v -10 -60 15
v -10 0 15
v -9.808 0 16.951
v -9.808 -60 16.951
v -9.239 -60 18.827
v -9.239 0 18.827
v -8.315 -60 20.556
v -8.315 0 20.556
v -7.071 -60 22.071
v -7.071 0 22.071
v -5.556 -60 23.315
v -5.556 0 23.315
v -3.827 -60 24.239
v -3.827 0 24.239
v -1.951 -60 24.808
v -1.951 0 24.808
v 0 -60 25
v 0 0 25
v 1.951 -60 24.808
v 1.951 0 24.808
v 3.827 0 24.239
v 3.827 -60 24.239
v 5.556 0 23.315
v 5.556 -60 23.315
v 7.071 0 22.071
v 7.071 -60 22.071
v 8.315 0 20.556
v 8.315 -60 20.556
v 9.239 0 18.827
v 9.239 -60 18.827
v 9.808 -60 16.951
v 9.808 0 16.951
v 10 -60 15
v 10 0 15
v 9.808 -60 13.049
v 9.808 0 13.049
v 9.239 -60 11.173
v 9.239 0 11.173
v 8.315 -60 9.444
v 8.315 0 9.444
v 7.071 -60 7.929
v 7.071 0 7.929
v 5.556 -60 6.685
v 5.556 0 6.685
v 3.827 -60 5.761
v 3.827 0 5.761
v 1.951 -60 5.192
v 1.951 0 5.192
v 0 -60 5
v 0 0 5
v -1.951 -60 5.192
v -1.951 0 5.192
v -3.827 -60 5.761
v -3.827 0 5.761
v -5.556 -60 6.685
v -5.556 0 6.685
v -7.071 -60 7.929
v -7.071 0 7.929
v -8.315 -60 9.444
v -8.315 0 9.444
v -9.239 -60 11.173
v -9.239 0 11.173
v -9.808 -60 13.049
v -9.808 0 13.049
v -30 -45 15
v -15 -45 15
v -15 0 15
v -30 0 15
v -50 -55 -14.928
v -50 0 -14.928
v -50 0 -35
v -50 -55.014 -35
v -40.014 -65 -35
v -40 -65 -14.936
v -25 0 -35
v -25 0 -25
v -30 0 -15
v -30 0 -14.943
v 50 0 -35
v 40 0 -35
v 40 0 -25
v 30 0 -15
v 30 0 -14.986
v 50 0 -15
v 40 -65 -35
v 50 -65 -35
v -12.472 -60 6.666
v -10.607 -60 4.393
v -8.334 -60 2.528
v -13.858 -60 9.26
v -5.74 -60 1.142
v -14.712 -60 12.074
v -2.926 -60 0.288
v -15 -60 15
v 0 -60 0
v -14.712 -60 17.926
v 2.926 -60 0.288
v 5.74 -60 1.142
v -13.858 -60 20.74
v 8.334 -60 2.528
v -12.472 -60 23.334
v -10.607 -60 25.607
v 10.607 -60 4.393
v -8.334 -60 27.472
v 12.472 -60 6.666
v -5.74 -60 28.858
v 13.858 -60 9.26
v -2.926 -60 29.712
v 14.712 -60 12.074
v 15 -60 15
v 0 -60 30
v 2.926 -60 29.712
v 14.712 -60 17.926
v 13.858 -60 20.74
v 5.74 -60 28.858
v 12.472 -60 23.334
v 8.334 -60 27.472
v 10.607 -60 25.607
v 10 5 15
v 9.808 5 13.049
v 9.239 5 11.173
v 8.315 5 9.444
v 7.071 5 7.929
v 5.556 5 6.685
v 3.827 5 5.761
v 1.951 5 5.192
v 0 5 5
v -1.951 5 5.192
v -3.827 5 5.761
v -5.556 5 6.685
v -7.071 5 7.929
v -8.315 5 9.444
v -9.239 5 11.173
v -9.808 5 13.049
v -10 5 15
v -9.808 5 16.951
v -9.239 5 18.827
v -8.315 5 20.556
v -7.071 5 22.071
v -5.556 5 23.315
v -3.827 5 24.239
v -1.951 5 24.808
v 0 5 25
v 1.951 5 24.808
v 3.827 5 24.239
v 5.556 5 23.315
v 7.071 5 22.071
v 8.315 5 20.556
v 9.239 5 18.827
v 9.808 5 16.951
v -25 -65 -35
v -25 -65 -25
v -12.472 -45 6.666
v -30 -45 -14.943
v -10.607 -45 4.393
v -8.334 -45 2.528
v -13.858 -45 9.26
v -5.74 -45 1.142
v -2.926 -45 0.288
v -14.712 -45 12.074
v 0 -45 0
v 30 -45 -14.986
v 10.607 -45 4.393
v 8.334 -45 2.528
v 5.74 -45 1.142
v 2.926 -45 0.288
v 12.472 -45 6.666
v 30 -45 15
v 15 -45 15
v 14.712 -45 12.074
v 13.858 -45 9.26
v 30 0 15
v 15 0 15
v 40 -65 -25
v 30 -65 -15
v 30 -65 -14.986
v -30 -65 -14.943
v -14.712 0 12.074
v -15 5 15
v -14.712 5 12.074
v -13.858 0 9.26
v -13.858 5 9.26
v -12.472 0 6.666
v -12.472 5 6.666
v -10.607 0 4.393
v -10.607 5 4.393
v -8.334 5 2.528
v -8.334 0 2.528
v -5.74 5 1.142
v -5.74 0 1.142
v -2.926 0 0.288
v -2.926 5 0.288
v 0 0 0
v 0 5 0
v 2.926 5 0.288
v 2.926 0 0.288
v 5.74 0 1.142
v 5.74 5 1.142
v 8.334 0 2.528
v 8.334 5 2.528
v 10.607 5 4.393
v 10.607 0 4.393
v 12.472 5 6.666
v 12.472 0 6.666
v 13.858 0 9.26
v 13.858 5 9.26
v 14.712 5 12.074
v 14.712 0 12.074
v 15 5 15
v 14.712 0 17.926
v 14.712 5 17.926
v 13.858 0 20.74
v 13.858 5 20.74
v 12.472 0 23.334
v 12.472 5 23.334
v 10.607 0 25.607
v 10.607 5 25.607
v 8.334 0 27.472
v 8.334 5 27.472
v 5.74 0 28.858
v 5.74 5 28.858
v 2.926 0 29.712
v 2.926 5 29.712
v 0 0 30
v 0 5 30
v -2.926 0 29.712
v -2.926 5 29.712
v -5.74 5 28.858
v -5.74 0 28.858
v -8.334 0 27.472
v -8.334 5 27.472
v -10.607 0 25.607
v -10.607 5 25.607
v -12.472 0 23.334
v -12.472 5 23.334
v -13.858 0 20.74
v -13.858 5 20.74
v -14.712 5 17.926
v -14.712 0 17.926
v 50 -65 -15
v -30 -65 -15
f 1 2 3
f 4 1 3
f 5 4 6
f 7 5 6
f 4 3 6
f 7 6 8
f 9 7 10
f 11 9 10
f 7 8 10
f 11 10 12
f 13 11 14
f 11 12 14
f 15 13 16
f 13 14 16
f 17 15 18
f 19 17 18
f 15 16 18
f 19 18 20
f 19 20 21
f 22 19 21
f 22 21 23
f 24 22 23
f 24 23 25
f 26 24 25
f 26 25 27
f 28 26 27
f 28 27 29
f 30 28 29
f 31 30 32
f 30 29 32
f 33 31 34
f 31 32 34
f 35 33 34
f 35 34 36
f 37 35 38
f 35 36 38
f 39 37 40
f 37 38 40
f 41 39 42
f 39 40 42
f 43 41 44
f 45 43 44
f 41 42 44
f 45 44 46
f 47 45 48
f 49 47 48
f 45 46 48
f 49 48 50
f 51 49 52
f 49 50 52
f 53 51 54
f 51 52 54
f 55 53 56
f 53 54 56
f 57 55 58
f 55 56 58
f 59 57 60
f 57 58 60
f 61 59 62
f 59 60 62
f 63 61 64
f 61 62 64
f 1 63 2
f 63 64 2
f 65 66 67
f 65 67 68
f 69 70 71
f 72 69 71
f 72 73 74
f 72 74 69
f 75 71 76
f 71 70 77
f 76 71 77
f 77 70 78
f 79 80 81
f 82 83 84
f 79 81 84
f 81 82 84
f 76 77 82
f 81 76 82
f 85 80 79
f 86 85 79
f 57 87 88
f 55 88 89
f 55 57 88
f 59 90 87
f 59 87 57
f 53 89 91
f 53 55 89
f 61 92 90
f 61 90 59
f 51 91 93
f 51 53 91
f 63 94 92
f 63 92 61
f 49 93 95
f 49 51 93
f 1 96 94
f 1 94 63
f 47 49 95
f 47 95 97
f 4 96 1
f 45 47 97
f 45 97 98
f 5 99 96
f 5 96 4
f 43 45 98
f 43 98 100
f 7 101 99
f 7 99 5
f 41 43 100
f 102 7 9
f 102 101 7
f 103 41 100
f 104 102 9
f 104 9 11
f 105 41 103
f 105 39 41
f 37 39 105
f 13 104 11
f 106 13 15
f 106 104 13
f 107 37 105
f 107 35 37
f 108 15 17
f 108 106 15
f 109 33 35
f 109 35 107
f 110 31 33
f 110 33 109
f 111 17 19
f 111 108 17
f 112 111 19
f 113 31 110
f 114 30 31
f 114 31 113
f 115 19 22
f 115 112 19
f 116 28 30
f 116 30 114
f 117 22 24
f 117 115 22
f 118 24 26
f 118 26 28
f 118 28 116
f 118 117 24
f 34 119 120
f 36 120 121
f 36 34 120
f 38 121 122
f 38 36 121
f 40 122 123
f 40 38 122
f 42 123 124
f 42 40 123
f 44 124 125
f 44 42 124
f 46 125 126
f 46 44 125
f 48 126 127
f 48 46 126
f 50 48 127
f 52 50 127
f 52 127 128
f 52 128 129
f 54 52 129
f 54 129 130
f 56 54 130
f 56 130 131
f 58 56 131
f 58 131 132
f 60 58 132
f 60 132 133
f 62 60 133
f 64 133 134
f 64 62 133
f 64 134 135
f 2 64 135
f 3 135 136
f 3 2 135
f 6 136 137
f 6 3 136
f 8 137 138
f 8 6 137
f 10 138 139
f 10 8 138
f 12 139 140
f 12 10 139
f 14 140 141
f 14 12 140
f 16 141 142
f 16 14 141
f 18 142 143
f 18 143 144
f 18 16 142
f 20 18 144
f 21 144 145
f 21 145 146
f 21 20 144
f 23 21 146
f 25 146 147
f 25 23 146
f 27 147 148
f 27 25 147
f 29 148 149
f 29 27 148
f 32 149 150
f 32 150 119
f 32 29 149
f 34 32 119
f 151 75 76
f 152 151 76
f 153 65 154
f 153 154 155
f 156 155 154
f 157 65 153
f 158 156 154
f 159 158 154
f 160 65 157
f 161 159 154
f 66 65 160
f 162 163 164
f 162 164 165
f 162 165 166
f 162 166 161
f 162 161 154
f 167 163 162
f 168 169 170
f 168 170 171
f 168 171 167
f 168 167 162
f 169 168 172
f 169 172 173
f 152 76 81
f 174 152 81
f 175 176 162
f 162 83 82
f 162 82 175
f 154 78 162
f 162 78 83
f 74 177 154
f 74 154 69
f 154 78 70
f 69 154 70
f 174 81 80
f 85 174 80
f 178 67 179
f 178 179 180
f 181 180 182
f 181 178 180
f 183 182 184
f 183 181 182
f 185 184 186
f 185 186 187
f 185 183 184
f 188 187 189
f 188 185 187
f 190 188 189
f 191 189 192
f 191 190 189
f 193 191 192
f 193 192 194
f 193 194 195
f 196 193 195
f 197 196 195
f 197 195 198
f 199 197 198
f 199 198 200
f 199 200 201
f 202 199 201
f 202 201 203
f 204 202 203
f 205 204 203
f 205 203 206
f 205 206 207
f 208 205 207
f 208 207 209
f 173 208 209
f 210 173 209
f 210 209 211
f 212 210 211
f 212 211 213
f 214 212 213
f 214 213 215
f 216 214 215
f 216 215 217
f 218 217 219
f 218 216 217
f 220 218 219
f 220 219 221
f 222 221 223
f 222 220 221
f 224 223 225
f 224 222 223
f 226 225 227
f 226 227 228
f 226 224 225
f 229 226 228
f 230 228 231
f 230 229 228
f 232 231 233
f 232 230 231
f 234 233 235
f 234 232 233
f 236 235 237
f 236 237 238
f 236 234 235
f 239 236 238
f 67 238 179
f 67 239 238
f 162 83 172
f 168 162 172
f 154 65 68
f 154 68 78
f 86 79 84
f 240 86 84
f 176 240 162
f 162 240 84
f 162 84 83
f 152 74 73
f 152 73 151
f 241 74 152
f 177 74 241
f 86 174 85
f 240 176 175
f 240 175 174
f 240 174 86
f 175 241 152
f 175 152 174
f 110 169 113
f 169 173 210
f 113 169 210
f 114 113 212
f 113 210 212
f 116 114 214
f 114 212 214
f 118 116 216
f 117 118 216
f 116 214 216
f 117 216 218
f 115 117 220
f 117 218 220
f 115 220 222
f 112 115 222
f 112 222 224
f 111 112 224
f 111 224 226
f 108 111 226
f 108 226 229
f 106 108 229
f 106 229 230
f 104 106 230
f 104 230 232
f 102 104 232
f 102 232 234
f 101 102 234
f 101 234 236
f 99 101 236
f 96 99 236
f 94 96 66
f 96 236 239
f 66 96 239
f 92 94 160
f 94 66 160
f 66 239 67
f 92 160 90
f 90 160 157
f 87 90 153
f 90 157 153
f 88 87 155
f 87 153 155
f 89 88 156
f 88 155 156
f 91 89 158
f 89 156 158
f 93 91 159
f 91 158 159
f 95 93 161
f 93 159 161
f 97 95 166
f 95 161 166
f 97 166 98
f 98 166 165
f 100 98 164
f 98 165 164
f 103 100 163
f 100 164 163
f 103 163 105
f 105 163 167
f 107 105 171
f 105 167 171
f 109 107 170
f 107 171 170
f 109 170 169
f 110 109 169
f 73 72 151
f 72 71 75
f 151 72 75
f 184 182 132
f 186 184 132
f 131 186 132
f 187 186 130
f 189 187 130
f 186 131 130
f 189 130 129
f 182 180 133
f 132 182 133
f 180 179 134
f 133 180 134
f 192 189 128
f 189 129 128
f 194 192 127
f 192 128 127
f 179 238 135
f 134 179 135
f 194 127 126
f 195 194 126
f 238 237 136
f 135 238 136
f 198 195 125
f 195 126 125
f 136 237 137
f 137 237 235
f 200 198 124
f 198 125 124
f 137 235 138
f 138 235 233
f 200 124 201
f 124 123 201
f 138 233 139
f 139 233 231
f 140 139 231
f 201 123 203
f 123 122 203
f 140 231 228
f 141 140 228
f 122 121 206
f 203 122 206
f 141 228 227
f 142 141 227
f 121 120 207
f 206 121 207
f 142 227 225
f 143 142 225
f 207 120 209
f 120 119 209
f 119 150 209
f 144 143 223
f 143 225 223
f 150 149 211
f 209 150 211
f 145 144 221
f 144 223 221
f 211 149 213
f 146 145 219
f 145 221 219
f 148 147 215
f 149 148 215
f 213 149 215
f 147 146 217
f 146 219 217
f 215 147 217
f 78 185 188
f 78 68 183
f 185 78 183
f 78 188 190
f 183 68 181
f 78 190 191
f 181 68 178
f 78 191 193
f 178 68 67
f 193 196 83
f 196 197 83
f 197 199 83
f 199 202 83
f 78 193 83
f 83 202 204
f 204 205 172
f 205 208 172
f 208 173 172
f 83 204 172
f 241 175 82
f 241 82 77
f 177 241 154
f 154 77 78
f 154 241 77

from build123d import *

# Parameters (mm, degrees)
F1_DEPTH = 65
F2_DEPTH = 45
F3_DEPTH = 60
F5_DEPTH = 25
F6_DEPTH = 5
F7_DEPTH = 5


with BuildPart() as f1:
    # F0 (on Front) → F1 (new body)
    with BuildSketch(Plane.XZ):
        Polygon((40, -35), (50, -35), (50, -15), (30, -14.9856810346), (30, -15), (-30, -15), (-30, -14.9427241385), (-50, -14.9284051731), (-50, -35), (-25, -35), (-25, -25), (40, -25), align=None)
    extrude(amount=F1_DEPTH)

    # F4 (on face) → F5 (cut)
    with BuildSketch(Plane(origin=(-0.0107135894, 0, -14.9641949162), x_dir=(0.9999997437, 0, -0.0007159481), z_dir=(0.0007159481, 0, 0.9999997437))):
        Polygon((-39.9892940965, -65), (-49.9892992224, -55), (-49.9892992224, -65), align=None)
    extrude(amount=-F5_DEPTH, mode=Mode.SUBTRACT)



with BuildPart() as f2:
    # F0 (on Front) → F2 (new body)
    with BuildSketch(Plane.XZ):
        with BuildLine():
            Line((-30, -14.9427241385), (30, -14.9856810346))
            Line((30, -14.9856810346), (30, 15))
            Line((30, 15), (15, 15))
            ThreePointArc((15, 15), (0, 0), (-15, 15))
            Line((-15, 15), (-30, 15))
            Line((-30, 15), (-30, -14.9427241385))
        make_face()
    extrude(amount=F2_DEPTH)

    # F0 (on Front) → F3 (join)
    with BuildSketch(Plane.XZ):
        with BuildLine():
            ThreePointArc((-15, 15), (0, 0), (15, 15))
            Line((15, 15), (10, 15))
            ThreePointArc((10, 15), (0, 5), (-10, 15))
            Line((-10, 15), (-15, 15))
        make_face()
        with BuildLine():
            Line((10, 15), (15, 15))
            ThreePointArc((15, 15), (0, 30), (-15, 15))
            Line((-15, 15), (-10, 15))
            ThreePointArc((-10, 15), (0, 25), (10, 15))
        make_face()
    extrude(amount=F3_DEPTH)

    # F0 (on Front) → F6 (join)
    with BuildSketch(Plane.XZ):
        with BuildLine():
            Line((10, 15), (15, 15))
            ThreePointArc((15, 15), (0, 30), (-15, 15))
            Line((-15, 15), (-10, 15))
            ThreePointArc((-10, 15), (0, 25), (10, 15))
        make_face()
        with BuildLine():
            ThreePointArc((-15, 15), (0, 0), (15, 15))
            Line((15, 15), (10, 15))
            ThreePointArc((10, 15), (0, 5), (-10, 15))
            Line((-10, 15), (-15, 15))
        make_face()
    extrude(amount=-F6_DEPTH)


with BuildPart() as f1_1:
    add(f1.part)

    add(f2.part)  # F7 merges F2
    # F0 (on Front) → F7 (join)
    with BuildSketch(Plane.XZ):
        with BuildLine():
            Line((-30, -14.9427241385), (30, -14.9856810346))
            Line((30, -14.9856810346), (30, 15))
            Line((30, 15), (15, 15))
            ThreePointArc((15, 15), (0, 0), (-15, 15))
            Line((-15, 15), (-30, 15))
            Line((-30, 15), (-30, -14.9427241385))
        make_face()
    extrude(amount=F7_DEPTH)


solid = f1_1.part
